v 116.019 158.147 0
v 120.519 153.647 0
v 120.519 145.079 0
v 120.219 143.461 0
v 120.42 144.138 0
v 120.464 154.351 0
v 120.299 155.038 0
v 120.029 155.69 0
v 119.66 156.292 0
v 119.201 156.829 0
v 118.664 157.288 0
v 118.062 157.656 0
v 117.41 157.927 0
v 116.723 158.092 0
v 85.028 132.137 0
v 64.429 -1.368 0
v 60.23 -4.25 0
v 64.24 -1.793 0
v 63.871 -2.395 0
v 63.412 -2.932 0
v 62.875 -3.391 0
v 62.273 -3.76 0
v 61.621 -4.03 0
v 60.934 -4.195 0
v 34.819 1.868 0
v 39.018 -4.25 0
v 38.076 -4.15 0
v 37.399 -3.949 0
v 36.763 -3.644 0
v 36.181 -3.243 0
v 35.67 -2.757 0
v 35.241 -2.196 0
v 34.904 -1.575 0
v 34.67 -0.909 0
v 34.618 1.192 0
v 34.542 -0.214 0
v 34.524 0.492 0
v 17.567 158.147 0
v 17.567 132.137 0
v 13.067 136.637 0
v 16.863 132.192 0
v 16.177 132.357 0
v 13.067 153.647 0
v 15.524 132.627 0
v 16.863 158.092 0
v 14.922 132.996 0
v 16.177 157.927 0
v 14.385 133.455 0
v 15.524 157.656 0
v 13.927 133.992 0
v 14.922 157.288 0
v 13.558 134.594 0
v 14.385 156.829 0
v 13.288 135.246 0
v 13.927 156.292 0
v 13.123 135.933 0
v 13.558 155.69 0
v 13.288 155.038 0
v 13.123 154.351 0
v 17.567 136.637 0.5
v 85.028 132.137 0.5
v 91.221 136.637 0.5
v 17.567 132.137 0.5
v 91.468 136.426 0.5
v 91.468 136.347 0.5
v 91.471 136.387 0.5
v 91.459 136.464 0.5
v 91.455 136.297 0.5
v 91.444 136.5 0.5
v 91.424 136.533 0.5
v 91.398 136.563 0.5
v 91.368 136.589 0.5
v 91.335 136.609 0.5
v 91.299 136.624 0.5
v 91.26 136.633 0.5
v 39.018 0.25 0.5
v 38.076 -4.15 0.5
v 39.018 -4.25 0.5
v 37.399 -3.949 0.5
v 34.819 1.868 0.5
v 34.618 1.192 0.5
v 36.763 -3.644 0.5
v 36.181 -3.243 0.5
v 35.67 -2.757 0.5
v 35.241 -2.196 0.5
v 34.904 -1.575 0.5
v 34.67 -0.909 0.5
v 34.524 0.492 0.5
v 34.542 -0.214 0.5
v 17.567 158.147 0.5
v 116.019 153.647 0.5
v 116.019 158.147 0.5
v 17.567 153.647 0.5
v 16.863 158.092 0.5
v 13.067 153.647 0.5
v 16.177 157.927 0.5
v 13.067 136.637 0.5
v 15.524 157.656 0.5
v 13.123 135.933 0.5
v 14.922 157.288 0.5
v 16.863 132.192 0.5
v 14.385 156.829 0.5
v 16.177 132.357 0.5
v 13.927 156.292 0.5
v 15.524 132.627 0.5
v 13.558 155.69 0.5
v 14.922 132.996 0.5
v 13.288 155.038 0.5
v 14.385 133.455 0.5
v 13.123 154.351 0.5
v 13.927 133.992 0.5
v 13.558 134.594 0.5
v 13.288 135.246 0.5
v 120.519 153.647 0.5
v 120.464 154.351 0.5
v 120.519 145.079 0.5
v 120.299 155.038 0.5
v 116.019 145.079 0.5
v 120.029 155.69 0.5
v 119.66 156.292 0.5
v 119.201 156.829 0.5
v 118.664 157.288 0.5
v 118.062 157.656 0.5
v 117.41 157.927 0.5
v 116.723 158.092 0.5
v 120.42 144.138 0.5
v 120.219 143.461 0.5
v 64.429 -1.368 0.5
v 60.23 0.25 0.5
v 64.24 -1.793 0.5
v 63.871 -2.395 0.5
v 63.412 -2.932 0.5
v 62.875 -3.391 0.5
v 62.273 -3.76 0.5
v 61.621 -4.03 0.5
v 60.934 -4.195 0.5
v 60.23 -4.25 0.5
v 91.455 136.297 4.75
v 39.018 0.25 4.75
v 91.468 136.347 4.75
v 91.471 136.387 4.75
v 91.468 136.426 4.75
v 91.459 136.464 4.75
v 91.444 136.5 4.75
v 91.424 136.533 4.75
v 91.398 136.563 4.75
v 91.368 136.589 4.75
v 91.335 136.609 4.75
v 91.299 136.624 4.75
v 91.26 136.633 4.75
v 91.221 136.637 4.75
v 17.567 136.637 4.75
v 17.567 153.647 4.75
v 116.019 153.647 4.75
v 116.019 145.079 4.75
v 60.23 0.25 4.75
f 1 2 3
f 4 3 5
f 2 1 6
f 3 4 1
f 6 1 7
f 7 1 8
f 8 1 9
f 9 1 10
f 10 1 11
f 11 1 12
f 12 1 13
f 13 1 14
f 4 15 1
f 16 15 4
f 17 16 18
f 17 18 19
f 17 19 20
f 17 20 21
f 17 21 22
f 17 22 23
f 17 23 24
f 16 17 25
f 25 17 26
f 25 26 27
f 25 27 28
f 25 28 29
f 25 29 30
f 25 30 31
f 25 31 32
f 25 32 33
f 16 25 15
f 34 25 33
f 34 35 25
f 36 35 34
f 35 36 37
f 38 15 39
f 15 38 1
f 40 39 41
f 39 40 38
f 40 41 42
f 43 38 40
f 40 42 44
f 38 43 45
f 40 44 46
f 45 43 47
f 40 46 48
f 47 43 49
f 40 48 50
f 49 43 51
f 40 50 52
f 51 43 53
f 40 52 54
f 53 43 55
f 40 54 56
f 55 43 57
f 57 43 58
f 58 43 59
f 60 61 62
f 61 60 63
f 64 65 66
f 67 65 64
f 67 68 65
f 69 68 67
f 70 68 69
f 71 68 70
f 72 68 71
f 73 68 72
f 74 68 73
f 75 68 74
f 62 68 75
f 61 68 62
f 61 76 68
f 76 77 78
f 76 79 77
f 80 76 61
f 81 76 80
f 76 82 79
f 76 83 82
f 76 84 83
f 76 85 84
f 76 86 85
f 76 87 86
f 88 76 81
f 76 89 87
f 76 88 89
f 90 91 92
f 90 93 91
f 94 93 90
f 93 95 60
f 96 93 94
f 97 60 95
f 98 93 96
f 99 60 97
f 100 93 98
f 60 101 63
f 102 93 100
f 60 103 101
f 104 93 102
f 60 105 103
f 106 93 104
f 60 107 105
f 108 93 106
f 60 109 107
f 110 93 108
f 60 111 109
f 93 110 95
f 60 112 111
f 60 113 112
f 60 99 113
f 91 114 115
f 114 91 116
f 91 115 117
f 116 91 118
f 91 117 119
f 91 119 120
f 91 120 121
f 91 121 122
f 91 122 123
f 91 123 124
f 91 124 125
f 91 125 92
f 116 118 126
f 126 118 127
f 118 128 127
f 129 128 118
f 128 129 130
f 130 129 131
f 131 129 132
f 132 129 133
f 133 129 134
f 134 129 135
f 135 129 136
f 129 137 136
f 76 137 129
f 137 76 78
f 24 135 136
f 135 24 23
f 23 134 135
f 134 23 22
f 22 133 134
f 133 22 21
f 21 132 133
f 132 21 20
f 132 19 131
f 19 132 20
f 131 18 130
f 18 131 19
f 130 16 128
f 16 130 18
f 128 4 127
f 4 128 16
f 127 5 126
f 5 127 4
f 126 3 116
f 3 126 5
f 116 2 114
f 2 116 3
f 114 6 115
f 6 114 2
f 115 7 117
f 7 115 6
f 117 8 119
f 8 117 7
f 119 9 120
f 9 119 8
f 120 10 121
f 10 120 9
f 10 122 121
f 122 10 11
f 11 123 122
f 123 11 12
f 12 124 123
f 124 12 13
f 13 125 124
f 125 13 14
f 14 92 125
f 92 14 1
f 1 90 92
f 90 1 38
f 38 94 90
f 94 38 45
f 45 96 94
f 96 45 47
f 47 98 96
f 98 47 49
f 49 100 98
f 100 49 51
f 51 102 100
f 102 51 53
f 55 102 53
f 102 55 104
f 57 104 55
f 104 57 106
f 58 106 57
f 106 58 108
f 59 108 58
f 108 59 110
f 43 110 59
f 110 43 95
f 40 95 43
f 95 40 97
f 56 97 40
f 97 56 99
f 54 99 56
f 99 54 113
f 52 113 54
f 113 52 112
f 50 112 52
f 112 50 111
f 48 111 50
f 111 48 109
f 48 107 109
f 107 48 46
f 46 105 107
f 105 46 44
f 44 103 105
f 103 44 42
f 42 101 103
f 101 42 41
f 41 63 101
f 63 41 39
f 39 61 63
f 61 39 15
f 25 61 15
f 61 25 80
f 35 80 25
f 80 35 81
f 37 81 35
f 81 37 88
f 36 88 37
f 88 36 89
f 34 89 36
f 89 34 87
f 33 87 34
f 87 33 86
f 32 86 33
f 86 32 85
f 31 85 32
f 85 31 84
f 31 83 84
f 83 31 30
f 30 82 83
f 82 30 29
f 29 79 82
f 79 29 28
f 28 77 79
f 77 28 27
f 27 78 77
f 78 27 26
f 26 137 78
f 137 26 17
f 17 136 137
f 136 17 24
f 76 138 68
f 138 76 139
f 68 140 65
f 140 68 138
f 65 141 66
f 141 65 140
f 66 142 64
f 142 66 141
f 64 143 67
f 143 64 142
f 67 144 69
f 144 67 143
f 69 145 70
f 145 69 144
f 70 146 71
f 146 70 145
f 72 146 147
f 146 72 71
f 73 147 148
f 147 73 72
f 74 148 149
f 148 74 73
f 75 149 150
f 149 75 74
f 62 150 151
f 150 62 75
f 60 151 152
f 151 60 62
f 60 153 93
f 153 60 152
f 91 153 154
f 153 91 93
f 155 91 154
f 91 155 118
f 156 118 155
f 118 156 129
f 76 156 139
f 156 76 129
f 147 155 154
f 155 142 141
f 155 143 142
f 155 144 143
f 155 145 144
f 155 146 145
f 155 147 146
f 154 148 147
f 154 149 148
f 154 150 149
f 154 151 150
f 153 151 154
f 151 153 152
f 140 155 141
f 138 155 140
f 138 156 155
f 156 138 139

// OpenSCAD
// Prints house numbers, with outlines and holes.
// Copyright (c) 2016 Robert M Diamond all rights reserved.
// License: Creative Commons, free to use for all purposes.

// Got the font off dafont.com, Megadeth by Shane McFee
$fn=40;
module stencil() {
    difference() {
        cube([130,160,2]);
        translate([10,29,-.1]) linear_extrude(2.2) text(text="7",font="Megadeth:style=Cryptic", size=152);
    }
}

module outline(thickness=2) {
    difference() {
        offset(r=thickness) children();
        children();
    }
}

module countersunk(h=4.75) {
    union() {
        translate([0,0,-0.1]) cylinder(r=1, h=h+.1);
        translate([0,0,h/2]) cylinder(r=2,h=h/2+.1);
    }
}

//linear_extrude(4) outline(4.25) text(text="7",font="Megadeth:style=Cryptic", size=152);
difference() {
    union() {
        color([.7,.7,.7,1]) linear_extrude(.5) outline(4.5) offset(r=-.25) 
        text(text="7",font="Megadeth:style=Cryptic", size=152);
        color([.2,.2,.2,1]) linear_extrude(4.75) offset(r=-.25) text(text="7",font="Megadeth:style=Cryptic", size=152);
    }
    translate([60,115,0]) countersunk();
    translate([30,10,0]) countersunk();
}
